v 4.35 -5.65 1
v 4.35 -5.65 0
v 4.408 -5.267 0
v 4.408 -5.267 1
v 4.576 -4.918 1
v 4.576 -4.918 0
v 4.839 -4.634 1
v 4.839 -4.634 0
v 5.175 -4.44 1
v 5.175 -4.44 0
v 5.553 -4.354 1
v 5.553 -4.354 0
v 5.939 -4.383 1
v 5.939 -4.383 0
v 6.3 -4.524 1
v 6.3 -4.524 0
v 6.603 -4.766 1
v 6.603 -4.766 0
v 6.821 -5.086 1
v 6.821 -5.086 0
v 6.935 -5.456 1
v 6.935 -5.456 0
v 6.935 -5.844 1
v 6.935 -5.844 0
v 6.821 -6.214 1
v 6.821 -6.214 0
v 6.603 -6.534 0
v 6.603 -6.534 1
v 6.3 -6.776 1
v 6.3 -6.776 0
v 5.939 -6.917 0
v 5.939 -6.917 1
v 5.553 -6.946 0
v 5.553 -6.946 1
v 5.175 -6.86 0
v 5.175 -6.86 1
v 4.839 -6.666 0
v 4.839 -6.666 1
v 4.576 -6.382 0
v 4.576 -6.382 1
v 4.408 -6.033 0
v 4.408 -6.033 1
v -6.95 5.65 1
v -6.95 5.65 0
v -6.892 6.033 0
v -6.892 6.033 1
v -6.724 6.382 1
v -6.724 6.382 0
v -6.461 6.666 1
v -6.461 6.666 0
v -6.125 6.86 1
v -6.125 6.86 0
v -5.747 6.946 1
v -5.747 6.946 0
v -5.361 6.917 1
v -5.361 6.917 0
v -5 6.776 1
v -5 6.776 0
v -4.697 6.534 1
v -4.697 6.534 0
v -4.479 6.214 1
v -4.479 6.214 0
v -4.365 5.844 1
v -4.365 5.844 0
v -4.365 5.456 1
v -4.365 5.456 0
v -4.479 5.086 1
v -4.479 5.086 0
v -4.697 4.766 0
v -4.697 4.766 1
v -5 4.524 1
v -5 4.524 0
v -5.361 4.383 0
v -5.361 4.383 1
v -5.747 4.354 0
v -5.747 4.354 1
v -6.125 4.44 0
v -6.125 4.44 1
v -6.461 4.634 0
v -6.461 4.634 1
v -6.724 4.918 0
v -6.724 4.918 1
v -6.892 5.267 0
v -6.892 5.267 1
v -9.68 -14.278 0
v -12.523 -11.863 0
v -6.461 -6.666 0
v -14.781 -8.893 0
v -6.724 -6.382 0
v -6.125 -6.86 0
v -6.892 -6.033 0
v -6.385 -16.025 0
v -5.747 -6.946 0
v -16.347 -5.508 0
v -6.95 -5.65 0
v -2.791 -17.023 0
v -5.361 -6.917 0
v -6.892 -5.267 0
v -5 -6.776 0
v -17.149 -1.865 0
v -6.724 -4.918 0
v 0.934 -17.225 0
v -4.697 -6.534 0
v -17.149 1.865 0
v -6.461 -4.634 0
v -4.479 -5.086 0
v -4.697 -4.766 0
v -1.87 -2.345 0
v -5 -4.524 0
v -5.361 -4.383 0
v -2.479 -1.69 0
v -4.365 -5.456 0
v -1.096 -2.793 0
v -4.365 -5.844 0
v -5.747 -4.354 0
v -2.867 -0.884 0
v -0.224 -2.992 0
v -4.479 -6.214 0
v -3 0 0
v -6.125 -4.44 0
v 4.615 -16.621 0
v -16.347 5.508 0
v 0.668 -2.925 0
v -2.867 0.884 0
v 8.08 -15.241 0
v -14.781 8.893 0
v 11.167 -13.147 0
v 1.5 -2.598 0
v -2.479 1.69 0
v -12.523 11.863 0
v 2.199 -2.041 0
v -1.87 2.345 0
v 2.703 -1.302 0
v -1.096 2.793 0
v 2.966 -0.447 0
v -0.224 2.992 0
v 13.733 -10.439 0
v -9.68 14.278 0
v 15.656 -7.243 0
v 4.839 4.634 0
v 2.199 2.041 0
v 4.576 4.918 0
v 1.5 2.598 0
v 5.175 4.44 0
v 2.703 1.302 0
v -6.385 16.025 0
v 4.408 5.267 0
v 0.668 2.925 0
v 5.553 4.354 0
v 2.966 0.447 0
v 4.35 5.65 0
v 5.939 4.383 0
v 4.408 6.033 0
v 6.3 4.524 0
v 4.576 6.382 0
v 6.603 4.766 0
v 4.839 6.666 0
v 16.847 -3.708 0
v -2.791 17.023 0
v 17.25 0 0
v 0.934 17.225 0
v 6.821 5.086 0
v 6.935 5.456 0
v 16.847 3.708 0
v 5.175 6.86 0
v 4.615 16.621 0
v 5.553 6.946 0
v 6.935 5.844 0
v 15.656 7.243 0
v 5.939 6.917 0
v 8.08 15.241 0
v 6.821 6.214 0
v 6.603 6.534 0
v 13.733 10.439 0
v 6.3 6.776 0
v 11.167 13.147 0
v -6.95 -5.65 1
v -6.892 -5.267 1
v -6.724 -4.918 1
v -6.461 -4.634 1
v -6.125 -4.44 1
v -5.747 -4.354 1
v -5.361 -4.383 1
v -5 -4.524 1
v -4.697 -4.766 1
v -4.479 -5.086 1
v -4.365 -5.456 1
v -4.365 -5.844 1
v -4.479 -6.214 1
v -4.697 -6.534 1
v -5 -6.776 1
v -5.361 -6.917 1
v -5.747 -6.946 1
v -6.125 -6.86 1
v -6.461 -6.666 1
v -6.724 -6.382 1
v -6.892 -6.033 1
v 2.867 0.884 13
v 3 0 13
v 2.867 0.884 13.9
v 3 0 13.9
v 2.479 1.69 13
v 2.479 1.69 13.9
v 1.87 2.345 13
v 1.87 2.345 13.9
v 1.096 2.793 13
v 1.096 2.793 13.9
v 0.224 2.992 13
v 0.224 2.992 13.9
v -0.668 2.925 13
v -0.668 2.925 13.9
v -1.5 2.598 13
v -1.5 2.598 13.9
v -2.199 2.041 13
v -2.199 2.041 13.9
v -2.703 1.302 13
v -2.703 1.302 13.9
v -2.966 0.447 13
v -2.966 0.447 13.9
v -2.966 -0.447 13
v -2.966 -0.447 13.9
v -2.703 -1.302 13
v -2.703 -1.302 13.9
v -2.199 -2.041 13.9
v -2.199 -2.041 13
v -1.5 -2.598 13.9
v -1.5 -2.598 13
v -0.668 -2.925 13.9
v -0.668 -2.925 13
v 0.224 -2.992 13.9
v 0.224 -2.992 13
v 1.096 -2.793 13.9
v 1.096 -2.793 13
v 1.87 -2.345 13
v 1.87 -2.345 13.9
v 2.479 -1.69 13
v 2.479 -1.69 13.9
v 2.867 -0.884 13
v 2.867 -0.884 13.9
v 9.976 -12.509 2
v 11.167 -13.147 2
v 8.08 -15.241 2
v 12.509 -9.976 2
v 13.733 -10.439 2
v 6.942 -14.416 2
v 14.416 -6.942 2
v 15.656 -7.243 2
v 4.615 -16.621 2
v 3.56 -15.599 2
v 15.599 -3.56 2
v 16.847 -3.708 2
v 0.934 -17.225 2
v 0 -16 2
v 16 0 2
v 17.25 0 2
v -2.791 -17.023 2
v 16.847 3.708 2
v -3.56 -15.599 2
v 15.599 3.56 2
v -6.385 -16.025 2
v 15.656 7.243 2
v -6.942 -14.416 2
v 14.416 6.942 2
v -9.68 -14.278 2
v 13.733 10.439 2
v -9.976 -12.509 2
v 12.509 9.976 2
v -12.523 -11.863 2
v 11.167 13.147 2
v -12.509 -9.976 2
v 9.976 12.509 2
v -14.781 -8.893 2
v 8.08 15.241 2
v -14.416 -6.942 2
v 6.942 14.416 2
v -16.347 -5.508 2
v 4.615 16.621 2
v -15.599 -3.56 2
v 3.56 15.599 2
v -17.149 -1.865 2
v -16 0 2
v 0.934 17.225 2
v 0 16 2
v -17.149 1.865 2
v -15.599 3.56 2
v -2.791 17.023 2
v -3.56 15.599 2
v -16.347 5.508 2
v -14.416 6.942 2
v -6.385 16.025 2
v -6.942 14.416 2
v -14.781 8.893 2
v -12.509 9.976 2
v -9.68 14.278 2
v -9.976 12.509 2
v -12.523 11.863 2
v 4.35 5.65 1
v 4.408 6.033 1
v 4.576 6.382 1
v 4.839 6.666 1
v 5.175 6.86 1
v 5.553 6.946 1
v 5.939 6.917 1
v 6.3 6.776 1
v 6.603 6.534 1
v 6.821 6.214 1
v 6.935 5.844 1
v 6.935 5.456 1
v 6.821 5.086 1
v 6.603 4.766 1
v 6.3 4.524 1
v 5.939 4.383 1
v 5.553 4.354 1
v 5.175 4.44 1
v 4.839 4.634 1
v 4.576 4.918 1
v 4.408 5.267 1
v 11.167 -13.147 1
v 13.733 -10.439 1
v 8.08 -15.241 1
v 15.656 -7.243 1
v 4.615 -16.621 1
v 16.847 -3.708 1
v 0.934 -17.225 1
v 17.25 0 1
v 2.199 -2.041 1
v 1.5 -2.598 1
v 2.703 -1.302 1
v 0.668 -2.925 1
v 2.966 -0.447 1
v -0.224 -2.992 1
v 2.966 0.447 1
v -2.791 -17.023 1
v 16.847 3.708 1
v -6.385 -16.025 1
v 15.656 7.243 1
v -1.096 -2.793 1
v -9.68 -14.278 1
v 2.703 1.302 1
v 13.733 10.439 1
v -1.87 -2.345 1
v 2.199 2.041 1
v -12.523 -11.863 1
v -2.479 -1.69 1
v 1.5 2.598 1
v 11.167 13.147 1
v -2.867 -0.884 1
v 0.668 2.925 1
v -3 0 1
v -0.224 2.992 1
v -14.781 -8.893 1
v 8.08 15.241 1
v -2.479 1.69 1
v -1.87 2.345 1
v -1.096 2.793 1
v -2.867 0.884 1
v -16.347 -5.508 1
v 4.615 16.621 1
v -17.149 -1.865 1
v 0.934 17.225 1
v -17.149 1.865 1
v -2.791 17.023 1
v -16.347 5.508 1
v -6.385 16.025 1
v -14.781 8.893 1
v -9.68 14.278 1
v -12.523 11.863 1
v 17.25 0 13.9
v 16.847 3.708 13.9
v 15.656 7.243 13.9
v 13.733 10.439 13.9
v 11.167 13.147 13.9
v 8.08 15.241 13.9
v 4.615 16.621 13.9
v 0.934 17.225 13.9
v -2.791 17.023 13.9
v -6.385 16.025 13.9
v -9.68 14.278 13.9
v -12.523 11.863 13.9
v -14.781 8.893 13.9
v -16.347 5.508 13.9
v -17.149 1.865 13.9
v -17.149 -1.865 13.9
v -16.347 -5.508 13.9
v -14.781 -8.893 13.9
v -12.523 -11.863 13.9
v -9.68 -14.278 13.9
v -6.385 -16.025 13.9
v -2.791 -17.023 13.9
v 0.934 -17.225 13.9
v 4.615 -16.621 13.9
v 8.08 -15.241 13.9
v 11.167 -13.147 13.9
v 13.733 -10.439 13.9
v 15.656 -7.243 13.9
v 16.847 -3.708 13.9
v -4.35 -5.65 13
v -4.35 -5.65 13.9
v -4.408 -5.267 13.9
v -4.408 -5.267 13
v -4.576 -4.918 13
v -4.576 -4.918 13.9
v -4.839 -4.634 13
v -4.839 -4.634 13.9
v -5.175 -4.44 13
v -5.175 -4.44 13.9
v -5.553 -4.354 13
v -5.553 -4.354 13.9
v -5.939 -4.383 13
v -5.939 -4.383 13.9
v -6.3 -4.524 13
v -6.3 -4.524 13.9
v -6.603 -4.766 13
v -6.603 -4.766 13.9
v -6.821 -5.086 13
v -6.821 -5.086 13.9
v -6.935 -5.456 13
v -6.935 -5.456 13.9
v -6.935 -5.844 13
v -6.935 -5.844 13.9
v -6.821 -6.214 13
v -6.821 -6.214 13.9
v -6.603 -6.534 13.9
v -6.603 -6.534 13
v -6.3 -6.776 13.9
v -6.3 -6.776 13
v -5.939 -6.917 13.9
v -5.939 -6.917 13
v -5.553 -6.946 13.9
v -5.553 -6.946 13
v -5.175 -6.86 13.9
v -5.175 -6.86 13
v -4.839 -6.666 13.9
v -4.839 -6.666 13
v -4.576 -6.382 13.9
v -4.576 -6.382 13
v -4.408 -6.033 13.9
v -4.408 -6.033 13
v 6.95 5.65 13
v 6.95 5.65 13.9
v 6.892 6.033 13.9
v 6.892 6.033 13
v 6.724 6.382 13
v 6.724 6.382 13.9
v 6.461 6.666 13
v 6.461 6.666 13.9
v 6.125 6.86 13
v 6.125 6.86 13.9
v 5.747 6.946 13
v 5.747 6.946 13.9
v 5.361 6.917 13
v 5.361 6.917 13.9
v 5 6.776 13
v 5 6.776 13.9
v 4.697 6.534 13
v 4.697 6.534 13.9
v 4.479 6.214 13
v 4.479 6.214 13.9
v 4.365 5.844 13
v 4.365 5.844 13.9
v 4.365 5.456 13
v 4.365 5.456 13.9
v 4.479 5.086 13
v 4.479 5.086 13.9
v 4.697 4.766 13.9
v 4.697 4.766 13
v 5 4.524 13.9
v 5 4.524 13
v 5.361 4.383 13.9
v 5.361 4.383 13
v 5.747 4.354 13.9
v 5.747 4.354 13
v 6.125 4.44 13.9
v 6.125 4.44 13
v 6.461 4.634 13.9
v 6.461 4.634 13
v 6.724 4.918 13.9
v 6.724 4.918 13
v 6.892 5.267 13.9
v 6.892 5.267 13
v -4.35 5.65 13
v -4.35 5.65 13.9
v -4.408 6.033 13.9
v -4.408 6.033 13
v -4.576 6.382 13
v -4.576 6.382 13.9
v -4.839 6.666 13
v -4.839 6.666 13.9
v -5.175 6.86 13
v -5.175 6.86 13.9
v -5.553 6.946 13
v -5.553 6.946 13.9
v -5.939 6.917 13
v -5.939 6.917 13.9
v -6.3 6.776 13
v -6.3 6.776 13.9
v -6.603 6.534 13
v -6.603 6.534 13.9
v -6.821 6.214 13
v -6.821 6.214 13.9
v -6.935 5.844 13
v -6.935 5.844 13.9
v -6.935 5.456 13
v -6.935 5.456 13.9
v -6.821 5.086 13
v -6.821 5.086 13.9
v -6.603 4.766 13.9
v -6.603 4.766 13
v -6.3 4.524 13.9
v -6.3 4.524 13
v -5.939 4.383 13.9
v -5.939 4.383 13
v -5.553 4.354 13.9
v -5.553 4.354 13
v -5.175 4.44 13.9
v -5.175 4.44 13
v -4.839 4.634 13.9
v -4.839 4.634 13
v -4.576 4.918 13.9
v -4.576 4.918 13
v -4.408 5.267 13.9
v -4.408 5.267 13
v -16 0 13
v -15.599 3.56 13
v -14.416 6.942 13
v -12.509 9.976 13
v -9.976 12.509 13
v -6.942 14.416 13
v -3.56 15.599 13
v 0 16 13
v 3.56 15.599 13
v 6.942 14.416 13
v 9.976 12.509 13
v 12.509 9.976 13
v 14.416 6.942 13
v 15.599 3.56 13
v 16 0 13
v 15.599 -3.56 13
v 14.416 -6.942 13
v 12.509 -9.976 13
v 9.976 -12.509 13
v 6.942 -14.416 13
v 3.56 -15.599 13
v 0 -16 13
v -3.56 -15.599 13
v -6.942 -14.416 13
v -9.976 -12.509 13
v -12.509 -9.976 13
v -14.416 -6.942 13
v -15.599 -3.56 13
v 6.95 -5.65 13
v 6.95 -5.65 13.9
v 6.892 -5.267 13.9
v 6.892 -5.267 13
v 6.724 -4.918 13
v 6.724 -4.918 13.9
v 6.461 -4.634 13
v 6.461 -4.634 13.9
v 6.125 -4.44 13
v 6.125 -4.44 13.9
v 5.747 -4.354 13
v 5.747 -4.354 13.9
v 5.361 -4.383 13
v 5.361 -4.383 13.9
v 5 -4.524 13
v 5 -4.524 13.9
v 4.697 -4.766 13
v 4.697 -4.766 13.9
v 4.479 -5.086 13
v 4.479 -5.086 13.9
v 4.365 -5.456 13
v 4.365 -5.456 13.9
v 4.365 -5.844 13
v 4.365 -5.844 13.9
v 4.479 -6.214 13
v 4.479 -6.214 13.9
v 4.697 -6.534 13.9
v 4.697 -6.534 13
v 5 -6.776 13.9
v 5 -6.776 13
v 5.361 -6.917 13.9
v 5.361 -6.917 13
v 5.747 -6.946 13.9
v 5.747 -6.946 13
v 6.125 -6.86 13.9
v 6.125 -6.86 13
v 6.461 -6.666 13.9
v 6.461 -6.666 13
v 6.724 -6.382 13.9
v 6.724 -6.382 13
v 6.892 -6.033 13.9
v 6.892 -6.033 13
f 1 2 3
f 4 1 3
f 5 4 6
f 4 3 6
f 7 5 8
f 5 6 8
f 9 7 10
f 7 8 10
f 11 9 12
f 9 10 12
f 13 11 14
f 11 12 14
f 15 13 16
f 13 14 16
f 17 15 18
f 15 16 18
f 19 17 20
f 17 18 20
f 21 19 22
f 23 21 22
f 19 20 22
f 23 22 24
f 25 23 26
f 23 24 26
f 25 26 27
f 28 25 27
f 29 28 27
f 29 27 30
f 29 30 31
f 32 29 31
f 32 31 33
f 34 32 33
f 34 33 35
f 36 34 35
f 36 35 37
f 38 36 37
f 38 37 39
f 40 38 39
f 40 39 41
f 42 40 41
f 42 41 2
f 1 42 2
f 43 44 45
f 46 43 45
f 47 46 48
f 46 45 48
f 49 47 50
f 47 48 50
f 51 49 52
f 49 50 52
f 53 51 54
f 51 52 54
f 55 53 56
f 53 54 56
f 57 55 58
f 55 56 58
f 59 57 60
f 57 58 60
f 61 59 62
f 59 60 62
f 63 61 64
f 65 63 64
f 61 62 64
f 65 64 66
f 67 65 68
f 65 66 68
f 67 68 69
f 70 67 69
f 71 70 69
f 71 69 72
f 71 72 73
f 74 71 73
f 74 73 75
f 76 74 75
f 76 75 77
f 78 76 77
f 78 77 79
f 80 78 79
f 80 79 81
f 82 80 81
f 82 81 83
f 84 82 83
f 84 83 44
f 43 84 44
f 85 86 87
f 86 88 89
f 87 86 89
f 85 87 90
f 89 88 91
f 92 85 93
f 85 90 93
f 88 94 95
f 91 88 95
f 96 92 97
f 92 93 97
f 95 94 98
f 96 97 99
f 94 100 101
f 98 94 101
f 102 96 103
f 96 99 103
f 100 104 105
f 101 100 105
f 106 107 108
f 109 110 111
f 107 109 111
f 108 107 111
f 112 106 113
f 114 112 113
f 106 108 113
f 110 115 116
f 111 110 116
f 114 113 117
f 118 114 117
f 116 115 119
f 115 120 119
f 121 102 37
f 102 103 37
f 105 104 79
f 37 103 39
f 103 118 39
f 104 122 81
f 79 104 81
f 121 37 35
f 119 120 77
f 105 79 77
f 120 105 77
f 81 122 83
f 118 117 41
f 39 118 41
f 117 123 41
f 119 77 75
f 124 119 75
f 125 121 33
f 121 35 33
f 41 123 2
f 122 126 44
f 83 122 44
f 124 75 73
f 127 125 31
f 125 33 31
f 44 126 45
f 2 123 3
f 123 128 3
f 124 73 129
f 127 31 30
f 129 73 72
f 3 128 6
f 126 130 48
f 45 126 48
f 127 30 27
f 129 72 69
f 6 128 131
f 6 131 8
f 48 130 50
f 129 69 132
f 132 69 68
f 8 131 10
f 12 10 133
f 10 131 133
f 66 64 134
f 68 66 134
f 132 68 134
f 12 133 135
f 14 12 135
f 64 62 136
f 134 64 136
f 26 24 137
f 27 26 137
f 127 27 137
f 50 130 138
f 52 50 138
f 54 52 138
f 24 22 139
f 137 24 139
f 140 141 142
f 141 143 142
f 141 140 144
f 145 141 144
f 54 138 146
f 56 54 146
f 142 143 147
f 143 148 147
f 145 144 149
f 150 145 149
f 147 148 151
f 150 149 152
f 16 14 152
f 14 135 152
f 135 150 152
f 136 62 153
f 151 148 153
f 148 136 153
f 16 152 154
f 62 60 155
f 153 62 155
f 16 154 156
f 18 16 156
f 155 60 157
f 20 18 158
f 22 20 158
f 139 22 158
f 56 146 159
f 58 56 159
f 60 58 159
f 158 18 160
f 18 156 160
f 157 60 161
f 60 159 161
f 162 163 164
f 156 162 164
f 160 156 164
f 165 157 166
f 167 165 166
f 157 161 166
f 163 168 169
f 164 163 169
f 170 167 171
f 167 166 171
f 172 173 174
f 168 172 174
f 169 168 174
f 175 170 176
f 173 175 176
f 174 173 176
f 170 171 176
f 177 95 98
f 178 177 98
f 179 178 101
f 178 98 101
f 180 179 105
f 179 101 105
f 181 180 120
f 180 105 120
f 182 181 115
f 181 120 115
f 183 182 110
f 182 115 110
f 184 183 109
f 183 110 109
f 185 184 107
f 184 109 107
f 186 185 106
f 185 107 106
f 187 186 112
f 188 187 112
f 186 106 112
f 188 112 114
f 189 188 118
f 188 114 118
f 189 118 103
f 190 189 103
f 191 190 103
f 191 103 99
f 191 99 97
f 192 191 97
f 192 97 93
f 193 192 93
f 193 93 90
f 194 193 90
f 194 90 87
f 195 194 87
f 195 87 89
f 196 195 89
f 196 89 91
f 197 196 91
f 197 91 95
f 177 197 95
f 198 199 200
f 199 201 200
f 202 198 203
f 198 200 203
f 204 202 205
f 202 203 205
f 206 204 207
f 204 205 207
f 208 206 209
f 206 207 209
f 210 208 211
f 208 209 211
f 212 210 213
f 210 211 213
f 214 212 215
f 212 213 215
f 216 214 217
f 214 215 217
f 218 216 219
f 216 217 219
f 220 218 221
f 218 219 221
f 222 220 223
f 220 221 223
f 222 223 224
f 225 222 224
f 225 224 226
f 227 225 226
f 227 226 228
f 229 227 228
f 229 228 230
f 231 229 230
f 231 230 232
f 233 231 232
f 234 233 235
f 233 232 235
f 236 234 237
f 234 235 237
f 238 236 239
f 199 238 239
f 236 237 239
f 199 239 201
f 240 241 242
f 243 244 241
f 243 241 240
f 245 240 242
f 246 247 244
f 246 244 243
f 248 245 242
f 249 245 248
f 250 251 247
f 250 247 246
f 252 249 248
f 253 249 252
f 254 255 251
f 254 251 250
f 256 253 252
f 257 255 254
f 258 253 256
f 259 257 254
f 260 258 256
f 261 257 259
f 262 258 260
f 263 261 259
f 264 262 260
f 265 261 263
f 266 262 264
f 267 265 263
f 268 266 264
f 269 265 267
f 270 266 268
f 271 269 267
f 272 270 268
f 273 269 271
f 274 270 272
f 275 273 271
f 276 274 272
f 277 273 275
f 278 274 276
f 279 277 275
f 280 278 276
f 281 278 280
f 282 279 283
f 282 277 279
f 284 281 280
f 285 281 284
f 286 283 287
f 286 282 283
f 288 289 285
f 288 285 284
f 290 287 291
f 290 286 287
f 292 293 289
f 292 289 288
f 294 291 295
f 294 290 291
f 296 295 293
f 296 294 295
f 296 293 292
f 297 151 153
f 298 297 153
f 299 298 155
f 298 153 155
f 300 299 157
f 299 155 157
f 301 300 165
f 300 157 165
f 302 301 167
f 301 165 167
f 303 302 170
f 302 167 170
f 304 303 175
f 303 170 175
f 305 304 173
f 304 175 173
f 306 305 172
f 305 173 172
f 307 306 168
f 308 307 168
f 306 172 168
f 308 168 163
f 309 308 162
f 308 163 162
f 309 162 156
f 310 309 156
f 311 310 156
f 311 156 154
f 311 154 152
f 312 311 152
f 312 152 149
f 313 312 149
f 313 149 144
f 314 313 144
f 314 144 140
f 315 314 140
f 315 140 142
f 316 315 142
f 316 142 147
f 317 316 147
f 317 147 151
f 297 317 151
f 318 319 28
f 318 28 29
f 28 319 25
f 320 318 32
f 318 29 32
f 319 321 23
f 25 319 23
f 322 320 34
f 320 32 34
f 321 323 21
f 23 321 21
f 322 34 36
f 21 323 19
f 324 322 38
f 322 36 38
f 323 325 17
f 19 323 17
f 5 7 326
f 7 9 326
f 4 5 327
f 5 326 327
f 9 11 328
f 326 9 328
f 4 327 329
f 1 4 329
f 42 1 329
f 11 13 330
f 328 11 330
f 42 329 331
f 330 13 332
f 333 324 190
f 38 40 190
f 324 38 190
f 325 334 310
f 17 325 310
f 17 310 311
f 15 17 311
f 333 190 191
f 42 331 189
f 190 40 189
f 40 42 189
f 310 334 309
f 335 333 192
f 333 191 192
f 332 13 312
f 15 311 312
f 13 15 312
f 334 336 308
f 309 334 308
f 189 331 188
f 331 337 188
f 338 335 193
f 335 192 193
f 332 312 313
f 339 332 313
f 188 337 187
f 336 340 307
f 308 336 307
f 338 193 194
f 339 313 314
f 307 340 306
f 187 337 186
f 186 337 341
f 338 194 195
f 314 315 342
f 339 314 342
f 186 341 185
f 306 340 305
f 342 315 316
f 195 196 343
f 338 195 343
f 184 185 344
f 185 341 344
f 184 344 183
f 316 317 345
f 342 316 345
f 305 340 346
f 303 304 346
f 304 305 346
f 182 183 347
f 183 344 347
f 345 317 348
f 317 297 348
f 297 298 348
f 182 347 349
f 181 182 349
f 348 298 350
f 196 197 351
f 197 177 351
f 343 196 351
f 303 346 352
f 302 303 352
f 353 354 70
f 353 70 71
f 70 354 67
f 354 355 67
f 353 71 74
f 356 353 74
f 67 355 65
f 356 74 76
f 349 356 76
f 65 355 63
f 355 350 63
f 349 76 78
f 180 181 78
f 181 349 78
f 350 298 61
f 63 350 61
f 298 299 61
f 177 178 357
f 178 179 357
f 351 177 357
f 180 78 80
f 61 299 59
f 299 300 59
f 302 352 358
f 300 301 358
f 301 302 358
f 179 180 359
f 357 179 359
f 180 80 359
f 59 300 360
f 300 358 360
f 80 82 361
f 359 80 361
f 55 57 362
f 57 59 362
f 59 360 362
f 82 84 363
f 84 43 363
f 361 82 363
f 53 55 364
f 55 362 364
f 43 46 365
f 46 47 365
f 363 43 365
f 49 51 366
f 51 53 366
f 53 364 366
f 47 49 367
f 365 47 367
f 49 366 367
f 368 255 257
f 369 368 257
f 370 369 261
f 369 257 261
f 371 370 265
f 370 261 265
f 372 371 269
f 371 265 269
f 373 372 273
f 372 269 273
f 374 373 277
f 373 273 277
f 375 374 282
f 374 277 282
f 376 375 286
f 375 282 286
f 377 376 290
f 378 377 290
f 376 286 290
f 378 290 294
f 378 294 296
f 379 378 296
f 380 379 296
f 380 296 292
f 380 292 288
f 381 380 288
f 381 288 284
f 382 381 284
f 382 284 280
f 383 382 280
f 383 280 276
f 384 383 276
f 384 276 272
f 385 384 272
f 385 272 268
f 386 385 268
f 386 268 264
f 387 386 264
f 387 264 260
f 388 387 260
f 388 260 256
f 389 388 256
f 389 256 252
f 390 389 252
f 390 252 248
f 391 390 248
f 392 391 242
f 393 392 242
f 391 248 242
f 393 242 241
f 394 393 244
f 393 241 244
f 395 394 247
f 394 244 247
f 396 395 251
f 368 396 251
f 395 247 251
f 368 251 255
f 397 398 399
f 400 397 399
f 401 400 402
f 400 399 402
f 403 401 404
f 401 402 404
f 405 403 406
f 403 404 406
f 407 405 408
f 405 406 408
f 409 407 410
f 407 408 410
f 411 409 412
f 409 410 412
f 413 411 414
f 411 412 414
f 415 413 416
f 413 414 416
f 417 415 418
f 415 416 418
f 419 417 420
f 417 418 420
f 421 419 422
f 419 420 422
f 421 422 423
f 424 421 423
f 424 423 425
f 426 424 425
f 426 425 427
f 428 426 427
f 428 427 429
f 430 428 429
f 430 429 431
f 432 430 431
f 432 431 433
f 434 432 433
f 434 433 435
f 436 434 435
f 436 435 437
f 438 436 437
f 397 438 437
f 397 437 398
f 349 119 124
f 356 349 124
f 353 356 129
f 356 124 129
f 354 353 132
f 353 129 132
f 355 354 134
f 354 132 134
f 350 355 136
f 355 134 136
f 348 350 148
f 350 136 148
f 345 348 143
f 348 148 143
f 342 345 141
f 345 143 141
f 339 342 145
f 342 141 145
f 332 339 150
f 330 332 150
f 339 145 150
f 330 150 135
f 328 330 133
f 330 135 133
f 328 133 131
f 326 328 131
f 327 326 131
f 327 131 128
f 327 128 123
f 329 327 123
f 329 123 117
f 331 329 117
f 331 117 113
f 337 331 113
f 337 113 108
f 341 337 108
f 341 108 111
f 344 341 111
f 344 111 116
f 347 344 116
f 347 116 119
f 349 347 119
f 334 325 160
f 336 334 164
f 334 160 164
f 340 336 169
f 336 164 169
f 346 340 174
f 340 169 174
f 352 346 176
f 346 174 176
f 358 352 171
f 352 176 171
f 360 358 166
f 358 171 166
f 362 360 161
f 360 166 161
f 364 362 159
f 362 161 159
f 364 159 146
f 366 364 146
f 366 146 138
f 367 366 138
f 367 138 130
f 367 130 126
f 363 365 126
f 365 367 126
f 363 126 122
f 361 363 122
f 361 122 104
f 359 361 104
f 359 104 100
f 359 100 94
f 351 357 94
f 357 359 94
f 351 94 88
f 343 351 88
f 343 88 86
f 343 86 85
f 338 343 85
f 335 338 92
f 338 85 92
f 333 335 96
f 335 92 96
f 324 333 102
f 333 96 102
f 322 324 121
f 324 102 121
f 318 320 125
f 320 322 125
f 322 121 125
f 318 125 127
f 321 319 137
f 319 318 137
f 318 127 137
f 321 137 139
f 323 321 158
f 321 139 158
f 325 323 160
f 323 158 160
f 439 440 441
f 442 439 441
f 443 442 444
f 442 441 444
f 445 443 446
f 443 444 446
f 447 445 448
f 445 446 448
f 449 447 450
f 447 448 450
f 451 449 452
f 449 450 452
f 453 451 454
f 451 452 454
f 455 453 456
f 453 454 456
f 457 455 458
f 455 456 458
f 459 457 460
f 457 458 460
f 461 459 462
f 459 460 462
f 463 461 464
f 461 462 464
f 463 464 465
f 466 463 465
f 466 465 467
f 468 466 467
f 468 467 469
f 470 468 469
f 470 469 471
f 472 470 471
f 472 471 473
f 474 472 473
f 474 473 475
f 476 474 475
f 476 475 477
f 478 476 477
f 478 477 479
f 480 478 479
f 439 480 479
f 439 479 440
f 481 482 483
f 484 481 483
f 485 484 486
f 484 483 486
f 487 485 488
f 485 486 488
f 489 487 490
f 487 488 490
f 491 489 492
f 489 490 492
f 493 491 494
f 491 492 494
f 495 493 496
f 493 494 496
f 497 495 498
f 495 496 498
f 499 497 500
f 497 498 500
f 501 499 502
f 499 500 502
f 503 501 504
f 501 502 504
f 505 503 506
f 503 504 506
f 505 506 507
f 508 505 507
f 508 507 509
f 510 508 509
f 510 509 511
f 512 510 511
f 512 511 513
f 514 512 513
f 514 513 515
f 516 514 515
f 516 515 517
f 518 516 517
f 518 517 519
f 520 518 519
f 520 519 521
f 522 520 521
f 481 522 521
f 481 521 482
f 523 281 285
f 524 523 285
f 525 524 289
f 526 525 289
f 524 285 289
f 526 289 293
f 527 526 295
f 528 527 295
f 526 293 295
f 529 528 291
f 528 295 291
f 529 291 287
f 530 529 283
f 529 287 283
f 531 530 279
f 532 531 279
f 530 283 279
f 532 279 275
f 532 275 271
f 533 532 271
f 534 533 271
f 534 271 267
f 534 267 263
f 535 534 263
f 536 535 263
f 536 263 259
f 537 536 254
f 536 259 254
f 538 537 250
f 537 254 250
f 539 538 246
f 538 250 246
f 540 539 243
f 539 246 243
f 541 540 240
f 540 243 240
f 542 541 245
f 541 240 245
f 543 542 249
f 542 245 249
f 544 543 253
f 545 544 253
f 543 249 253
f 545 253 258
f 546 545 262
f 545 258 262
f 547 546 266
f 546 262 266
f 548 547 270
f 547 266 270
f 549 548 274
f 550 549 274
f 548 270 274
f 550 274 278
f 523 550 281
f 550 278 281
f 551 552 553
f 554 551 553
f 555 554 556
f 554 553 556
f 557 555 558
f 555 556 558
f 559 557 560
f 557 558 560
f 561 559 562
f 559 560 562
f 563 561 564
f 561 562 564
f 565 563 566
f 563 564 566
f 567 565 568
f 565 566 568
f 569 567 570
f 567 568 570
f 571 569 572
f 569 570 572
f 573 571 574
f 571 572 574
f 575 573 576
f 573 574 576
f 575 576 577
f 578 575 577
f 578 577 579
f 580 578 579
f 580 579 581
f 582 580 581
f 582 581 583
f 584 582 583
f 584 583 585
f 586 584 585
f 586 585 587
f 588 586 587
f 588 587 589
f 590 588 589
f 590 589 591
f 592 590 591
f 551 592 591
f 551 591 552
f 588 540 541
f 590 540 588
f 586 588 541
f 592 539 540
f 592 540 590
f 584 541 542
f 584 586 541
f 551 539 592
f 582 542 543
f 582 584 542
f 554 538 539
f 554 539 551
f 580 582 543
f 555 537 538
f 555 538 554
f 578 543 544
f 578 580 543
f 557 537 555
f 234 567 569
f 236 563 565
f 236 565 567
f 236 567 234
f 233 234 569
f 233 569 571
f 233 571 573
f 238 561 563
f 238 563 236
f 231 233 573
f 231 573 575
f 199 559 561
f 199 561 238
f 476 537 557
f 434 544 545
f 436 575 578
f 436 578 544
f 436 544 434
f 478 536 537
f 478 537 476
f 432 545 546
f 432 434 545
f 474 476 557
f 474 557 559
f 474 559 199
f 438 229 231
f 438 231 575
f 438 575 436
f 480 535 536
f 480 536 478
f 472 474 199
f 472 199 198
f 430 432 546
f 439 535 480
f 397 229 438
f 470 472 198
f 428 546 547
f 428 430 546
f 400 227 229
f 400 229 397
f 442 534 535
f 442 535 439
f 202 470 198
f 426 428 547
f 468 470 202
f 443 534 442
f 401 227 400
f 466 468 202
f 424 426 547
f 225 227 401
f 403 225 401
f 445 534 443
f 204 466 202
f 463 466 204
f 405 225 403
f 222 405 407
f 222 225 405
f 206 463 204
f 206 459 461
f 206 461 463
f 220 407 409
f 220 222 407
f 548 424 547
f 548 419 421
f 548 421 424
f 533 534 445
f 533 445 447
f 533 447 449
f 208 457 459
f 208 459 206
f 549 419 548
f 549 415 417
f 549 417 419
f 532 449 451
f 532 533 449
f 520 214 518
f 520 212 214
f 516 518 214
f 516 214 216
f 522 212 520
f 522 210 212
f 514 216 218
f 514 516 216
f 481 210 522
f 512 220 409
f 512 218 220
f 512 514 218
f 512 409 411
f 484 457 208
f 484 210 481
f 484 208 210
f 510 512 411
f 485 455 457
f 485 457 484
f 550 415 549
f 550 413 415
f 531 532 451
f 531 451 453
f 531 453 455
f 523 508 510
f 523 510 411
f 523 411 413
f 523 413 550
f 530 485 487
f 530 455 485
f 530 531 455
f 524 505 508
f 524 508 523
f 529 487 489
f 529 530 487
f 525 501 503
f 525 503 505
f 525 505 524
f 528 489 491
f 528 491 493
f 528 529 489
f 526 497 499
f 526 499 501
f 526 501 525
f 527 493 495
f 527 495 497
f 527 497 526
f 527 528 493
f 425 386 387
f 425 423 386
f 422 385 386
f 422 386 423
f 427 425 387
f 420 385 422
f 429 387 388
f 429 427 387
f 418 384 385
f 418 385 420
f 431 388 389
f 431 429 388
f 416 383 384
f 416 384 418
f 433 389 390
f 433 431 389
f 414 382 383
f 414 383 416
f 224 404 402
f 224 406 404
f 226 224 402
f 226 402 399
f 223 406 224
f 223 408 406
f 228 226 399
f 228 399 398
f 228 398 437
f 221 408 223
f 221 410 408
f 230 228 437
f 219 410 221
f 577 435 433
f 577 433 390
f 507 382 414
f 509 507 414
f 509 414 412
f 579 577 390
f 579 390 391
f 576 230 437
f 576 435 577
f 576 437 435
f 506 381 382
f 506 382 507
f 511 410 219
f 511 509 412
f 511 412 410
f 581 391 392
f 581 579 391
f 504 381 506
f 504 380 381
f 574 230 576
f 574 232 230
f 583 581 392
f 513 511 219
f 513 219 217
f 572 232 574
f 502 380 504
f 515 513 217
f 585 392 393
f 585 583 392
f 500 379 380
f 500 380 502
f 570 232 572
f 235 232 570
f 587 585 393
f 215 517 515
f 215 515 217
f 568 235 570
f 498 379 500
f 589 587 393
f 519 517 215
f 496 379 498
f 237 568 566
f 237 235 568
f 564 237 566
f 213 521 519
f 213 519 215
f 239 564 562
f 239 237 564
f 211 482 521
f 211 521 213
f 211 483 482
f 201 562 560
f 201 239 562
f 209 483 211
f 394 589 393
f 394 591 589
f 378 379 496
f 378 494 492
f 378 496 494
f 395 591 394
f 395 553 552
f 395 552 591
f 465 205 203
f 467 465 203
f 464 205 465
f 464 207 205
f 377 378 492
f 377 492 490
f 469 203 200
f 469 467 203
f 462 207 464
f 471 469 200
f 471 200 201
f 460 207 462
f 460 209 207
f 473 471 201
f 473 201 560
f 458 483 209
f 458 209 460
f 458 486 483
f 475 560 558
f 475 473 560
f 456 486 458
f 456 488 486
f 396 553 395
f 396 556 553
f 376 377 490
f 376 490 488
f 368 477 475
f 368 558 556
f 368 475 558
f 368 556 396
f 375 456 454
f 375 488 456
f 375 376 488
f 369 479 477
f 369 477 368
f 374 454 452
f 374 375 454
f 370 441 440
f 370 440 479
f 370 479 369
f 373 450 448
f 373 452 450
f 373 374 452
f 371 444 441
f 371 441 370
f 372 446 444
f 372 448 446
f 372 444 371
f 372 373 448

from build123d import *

# Parameters (mm, degrees)
SKETCH_1_R          = 17.25
EXTRUDE_1_DEPTH     = 13.9
SKETCH_3_R          = 17.25
CUT_EXTRUDE_2_DEPTH = 1
SKETCH_4_R          = 16
CUT_EXTRUDE_4_DEPTH = 11
SKETCH_5_R          = 1.3
SKETCH_5_R_2        = 3
CUT_EXTRUDE_5_DEPTH = 7.5
SKETCH_6_R          = 1.3
SKETCH_6_R_2        = 3
CUT_EXTRUDE_6_DEPTH = 10


with BuildPart() as part:
    # 草图1 → 凸台-拉伸1 (new body)
    with BuildSketch(Plane.XY):
        Circle(SKETCH_1_R)
    extrude(amount=EXTRUDE_1_DEPTH)

    # 草图3 → 切除-拉伸2 (cut)
    with BuildSketch(Plane(origin=(0, 0, 1), x_dir=(-1, 0, 0), z_dir=(0, 0, -1))):
        Circle(SKETCH_3_R)
    extrude(amount=-CUT_EXTRUDE_2_DEPTH, mode=Mode.SUBTRACT)

    # 草图4 → 切除-拉伸4 (cut)
    with BuildSketch(Plane(origin=(0, 0, 2), x_dir=(-1, 0, 0), z_dir=(0, 0, -1))):
        Circle(SKETCH_4_R)
    extrude(amount=-CUT_EXTRUDE_4_DEPTH, mode=Mode.SUBTRACT)

    # 草图5 → 切除-拉伸5 (cut, symmetric)
    with BuildSketch(Plane.XY.offset(13.9)):
        with Locations((5.65, 5.65)):
            Circle(SKETCH_5_R)
        with Locations((5.65, -5.65)):
            Circle(SKETCH_5_R)
        with Locations((-5.65, -5.65)):
            Circle(SKETCH_5_R)
        with Locations((-5.65, 5.65)):
            Circle(SKETCH_5_R)
        Circle(SKETCH_5_R_2)
    extrude(amount=CUT_EXTRUDE_5_DEPTH, both=True, mode=Mode.SUBTRACT)

    # 草图6 → 切除-拉伸6 (cut)
    with BuildSketch(Plane(origin=(0, 0, 0), x_dir=(-1, 0, 0), z_dir=(0, 0, -1))):
        with Locations((-5.65, 5.65)):
            Circle(SKETCH_6_R)
        with Locations((5.65, 5.65)):
            Circle(SKETCH_6_R)
        with Locations((5.65, -5.65)):
            Circle(SKETCH_6_R)
        with Locations((-5.65, -5.65)):
            Circle(SKETCH_6_R)
        Circle(SKETCH_6_R_2)
    extrude(amount=-CUT_EXTRUDE_6_DEPTH, mode=Mode.SUBTRACT)


solid = part.part
